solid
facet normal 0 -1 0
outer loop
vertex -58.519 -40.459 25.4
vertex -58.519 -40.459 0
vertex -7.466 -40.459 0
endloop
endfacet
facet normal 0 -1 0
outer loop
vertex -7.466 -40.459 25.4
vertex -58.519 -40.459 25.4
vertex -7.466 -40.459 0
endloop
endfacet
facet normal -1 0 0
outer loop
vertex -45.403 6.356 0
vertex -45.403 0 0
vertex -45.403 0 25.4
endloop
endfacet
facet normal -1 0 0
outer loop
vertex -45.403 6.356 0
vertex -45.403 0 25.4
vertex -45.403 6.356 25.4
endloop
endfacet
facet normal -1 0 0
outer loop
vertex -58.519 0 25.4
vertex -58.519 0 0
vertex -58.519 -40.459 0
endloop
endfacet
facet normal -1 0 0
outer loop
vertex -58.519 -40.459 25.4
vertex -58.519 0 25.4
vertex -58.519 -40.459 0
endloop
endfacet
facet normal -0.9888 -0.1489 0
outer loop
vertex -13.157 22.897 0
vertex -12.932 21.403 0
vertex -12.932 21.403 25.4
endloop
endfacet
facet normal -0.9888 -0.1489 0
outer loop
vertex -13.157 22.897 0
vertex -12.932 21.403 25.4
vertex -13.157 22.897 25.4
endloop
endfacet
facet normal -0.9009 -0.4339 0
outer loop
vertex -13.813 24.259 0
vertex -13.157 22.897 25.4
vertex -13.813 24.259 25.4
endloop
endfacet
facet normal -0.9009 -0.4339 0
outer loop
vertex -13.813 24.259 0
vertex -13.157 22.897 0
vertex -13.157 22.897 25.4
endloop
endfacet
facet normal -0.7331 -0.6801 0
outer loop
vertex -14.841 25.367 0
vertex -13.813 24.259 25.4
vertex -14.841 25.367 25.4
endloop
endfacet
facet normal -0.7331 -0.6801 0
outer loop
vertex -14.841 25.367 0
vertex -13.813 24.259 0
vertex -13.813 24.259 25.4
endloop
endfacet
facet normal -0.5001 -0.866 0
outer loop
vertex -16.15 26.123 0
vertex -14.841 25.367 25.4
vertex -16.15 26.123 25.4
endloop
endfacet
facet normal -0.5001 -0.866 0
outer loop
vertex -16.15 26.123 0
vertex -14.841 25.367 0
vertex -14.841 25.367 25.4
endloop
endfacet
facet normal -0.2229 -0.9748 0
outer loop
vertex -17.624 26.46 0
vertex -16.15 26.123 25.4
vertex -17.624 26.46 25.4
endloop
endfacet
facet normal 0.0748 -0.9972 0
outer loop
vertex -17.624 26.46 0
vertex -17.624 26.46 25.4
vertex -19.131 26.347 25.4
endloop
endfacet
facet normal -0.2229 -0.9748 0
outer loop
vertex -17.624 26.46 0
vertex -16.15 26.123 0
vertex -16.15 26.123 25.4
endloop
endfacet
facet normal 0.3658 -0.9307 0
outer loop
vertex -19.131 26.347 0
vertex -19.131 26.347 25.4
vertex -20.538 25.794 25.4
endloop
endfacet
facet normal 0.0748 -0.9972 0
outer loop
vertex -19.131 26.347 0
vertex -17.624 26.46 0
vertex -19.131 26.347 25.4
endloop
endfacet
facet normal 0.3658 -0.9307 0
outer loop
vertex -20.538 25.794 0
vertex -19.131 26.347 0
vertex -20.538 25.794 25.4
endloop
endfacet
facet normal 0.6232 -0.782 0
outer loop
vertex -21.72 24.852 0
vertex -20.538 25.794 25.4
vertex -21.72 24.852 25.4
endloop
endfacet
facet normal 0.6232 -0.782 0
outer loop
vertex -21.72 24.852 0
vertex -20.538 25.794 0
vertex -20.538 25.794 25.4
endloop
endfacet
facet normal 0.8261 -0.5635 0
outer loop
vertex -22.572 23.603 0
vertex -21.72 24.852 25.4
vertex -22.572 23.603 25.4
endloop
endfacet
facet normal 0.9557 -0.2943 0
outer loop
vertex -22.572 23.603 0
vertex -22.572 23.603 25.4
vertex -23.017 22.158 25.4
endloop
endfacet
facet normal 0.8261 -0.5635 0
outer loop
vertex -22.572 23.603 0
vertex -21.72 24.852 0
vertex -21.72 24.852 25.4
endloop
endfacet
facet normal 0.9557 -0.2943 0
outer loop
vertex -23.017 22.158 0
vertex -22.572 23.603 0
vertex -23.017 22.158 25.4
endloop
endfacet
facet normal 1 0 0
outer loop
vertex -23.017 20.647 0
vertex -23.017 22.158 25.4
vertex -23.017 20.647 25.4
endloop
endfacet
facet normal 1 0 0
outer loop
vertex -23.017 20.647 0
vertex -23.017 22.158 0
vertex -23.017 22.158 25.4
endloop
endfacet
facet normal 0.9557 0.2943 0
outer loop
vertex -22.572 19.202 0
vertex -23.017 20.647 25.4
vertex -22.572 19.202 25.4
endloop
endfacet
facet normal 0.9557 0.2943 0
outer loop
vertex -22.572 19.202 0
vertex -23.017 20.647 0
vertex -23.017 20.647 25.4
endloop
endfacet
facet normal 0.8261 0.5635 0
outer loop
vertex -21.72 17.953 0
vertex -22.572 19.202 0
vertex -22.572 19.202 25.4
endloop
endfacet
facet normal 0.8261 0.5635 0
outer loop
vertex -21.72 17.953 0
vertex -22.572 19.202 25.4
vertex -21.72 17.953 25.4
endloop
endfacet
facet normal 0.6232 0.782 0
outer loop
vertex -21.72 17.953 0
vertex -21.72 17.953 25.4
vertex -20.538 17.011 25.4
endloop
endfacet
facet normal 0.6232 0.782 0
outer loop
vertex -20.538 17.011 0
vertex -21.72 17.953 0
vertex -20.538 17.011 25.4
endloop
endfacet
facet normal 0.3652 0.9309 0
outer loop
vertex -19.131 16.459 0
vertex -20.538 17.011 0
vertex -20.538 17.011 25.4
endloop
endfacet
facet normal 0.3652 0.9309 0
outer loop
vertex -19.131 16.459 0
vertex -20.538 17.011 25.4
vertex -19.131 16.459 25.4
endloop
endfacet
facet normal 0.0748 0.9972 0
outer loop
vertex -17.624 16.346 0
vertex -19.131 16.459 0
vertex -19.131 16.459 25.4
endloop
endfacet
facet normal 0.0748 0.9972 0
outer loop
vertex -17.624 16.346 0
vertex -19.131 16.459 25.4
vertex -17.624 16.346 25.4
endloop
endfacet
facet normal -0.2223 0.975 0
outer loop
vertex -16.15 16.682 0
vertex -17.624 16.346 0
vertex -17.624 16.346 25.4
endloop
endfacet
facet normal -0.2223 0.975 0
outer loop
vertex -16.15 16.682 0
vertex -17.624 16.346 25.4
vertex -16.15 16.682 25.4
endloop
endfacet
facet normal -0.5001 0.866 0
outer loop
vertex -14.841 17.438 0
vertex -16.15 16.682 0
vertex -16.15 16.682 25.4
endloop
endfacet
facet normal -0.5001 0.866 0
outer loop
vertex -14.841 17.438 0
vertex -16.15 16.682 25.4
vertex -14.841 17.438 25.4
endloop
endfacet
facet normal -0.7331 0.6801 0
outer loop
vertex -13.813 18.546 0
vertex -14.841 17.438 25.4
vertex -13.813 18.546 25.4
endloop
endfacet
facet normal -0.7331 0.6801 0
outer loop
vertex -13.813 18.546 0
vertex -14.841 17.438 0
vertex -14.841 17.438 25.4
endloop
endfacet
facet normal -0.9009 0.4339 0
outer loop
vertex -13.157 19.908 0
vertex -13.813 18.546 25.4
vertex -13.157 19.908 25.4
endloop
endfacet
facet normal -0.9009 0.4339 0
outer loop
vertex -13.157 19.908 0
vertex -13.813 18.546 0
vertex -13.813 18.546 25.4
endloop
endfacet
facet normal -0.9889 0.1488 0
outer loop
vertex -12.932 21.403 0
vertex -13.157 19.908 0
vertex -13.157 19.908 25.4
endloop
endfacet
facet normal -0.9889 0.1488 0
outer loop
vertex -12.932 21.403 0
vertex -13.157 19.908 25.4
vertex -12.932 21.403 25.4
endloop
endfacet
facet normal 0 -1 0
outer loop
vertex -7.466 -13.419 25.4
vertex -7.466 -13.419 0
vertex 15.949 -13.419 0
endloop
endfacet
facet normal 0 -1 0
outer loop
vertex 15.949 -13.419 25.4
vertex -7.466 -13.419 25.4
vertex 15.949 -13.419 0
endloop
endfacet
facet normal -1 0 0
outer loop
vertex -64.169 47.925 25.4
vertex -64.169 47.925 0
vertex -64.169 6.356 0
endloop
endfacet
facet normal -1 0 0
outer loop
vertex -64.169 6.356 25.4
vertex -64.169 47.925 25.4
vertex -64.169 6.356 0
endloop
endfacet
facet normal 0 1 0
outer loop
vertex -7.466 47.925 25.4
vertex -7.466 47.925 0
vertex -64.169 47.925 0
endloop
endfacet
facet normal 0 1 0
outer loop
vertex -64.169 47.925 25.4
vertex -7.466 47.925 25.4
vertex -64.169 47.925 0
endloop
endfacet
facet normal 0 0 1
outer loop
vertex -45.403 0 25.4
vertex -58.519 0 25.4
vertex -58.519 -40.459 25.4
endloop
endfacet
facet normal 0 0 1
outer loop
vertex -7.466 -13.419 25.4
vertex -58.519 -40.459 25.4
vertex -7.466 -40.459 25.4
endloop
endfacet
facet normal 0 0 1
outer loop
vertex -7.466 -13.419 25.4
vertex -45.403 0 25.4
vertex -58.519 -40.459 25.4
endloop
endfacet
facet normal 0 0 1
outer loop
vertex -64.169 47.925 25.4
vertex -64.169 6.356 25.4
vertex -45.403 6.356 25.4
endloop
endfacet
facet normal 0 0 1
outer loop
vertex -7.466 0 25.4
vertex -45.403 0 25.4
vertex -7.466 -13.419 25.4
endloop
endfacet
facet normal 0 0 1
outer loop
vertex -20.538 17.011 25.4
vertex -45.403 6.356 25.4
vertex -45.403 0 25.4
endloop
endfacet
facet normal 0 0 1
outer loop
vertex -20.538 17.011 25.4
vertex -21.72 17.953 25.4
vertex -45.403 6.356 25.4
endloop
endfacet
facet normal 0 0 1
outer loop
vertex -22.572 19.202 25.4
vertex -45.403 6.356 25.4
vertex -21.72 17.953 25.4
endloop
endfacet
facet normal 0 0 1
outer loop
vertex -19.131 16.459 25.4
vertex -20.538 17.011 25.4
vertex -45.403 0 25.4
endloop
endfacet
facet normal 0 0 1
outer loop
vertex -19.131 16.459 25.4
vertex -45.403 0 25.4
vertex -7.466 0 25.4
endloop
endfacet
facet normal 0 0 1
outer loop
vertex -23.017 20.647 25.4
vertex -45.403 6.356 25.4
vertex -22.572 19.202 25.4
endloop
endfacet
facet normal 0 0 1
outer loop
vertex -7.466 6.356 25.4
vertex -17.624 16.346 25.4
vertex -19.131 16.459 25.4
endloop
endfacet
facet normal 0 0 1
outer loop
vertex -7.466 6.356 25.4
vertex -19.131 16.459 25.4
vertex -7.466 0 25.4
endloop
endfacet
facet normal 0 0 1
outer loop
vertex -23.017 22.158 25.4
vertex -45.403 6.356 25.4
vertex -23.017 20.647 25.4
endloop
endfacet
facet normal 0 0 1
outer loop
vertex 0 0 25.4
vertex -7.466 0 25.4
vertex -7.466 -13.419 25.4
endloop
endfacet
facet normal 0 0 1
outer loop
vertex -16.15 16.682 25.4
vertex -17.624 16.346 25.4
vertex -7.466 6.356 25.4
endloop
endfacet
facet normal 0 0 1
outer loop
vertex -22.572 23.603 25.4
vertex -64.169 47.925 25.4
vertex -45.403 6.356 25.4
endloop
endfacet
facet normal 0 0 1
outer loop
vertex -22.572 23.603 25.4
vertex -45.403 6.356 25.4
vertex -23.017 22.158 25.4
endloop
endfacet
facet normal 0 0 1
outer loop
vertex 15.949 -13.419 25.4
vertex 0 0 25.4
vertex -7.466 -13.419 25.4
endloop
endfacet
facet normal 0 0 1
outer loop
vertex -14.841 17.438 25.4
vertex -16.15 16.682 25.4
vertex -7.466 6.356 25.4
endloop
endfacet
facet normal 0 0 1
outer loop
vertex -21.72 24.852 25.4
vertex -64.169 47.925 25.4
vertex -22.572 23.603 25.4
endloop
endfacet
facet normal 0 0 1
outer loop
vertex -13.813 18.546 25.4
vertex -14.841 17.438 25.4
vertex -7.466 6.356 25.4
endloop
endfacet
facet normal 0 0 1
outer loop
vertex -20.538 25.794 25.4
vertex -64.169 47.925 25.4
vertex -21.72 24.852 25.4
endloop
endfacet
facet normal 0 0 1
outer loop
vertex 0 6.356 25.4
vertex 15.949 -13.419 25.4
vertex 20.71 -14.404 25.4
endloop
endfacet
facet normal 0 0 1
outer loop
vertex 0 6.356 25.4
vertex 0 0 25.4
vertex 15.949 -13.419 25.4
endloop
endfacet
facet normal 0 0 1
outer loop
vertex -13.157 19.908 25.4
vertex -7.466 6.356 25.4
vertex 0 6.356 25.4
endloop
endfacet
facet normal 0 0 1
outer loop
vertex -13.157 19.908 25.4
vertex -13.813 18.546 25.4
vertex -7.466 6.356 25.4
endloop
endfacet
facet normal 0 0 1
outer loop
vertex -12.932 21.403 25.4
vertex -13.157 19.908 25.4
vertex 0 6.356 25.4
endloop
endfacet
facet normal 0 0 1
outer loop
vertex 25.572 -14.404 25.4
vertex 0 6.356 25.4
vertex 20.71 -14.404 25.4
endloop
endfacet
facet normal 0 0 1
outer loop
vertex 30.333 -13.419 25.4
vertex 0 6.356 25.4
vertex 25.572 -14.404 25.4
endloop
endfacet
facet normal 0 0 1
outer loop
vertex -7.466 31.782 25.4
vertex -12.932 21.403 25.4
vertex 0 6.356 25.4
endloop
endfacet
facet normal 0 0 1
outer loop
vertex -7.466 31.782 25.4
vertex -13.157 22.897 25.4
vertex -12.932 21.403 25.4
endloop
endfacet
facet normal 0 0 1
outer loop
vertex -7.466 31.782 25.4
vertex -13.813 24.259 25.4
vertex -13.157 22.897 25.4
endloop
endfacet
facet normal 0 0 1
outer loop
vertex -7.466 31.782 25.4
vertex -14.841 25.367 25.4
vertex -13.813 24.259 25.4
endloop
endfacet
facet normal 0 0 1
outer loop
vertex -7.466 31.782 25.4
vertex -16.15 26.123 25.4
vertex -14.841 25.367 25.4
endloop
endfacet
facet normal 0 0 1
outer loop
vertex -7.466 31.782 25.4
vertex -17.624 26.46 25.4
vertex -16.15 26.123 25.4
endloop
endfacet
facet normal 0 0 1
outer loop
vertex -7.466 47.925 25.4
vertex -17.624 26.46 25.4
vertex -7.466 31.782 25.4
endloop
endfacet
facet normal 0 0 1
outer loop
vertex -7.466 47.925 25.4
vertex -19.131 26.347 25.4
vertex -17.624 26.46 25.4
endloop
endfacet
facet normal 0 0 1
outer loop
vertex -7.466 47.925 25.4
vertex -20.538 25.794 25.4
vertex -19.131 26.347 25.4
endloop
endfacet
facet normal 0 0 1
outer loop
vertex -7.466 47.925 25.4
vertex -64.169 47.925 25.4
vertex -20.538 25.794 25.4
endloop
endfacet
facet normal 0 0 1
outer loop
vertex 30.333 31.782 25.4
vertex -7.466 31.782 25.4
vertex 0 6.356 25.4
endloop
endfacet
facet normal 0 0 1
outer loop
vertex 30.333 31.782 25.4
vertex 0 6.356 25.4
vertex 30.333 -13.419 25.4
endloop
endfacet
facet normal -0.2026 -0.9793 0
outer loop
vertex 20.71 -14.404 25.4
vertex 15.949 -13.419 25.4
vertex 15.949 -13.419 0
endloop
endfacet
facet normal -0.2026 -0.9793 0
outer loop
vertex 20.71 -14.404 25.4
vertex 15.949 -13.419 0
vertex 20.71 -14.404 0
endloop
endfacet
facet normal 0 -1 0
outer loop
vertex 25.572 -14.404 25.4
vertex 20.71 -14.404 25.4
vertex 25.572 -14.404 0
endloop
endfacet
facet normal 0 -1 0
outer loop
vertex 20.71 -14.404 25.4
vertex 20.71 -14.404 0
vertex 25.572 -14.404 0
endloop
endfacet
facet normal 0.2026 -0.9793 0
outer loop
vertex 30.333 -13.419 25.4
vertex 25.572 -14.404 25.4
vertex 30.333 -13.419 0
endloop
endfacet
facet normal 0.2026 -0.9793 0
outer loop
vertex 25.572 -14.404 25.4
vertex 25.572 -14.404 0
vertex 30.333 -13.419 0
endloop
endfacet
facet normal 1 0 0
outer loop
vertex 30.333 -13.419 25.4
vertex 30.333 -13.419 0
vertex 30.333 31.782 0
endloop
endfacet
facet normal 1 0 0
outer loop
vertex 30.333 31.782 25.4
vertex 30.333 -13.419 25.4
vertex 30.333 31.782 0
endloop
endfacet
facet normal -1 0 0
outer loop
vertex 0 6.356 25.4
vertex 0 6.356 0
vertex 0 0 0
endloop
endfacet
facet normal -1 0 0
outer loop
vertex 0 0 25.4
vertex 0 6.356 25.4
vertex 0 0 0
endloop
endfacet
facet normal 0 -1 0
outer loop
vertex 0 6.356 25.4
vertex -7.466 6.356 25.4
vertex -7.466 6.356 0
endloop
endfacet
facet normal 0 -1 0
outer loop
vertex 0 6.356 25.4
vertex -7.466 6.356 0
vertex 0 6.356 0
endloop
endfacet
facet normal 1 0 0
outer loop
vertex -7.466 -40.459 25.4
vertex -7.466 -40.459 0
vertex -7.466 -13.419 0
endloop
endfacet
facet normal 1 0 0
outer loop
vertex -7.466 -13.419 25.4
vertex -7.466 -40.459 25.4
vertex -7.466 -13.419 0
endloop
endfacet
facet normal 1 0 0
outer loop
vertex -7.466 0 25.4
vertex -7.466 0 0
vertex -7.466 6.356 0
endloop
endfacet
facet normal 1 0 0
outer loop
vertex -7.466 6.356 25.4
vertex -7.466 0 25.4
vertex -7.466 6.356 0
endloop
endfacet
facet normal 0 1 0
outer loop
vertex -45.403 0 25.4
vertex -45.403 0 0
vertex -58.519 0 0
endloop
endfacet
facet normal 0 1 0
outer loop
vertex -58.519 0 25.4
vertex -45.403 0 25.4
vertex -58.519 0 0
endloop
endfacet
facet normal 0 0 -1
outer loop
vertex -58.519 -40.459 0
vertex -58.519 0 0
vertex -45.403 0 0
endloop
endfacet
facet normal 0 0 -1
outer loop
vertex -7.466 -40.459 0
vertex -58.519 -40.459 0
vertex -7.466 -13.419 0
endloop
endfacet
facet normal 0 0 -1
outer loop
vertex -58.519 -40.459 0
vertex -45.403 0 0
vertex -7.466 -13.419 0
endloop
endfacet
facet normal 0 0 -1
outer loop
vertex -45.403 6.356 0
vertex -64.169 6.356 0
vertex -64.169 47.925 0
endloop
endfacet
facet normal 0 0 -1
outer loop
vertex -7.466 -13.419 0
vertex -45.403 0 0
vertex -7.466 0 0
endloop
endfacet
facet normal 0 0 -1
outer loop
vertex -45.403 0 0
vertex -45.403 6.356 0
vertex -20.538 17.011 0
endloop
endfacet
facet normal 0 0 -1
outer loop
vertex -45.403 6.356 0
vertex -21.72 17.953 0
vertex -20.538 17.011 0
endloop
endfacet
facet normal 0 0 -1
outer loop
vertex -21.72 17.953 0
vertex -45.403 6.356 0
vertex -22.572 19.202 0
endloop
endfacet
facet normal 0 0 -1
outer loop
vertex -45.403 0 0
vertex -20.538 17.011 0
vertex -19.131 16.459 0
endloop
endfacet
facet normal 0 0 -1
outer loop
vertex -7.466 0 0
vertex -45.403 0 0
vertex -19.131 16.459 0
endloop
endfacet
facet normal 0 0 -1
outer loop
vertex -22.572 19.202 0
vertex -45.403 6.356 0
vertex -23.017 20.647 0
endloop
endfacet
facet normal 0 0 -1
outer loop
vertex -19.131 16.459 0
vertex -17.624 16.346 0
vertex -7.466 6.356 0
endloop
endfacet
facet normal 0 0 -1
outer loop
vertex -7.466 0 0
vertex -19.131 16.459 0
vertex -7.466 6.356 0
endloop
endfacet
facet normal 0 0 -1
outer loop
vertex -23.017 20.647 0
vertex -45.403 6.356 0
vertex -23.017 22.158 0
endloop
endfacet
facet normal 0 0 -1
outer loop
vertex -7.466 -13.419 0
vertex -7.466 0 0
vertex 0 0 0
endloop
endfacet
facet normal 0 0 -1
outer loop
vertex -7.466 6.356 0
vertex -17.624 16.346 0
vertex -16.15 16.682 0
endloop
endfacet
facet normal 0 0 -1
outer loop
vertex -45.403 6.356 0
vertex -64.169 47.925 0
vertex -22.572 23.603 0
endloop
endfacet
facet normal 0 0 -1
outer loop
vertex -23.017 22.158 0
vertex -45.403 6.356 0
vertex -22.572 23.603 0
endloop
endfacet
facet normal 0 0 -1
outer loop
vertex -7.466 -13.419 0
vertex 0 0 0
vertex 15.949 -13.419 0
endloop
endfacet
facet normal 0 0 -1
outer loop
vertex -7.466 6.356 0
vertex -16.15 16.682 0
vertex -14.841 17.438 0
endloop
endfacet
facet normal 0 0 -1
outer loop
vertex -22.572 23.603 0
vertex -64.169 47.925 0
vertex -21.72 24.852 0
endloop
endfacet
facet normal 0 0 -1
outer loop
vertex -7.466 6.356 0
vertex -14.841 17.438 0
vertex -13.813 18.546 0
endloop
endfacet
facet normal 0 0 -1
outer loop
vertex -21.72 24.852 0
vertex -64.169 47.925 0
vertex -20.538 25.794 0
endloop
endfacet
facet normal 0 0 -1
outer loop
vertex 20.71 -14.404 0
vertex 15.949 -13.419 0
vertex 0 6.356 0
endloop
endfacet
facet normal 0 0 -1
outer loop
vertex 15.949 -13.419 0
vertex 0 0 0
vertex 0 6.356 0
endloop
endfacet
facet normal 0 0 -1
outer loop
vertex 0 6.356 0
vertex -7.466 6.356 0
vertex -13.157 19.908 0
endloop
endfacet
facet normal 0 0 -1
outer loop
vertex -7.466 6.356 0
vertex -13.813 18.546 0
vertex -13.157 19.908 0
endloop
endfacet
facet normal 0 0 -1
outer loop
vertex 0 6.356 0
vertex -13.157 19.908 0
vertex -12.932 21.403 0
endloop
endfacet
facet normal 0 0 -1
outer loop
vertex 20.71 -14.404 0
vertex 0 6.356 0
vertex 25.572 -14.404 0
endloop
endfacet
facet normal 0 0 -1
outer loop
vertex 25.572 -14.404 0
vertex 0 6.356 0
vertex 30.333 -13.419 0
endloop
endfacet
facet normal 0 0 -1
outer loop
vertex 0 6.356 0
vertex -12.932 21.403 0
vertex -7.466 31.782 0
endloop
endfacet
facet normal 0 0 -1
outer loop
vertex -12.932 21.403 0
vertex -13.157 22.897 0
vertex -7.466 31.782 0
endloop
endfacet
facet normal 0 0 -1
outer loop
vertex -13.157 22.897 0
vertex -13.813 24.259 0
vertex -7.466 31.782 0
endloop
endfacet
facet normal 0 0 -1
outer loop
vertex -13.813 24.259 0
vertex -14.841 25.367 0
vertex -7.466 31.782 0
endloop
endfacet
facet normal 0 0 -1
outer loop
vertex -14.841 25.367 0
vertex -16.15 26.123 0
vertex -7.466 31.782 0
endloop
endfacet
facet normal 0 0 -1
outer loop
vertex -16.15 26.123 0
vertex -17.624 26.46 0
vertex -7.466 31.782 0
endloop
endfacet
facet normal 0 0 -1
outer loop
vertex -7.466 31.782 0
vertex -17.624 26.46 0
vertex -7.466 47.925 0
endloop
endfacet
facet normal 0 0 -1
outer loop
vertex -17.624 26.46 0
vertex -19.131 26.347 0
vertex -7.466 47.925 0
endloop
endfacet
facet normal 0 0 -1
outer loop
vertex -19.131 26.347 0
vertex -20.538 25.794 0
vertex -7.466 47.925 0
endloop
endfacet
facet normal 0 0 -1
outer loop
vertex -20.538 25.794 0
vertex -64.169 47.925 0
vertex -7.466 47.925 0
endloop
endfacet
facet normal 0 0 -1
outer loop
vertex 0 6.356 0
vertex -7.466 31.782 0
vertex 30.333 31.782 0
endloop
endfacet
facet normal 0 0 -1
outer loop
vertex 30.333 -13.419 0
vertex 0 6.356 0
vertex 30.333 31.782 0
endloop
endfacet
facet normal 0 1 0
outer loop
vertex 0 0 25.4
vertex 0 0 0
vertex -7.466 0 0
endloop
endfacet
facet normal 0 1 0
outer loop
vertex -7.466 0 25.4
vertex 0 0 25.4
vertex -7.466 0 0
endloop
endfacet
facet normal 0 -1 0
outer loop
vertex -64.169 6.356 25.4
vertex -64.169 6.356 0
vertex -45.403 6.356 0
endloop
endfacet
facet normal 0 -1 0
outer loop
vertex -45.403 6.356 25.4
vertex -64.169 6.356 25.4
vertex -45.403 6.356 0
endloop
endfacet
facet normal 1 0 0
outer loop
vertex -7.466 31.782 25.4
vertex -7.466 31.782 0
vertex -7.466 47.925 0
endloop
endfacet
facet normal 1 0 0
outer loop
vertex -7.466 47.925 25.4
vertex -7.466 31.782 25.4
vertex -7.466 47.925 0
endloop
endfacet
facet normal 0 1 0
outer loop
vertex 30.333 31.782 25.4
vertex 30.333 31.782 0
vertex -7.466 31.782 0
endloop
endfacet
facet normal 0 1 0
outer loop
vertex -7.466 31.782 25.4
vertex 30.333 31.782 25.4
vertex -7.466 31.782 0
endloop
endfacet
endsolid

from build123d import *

# Parameters (mm, degrees)
F0_W     = 37.936644163
F0_H     = 25.4256250337
F0_R     = 5.0710694704
F0_H_2   = 6.3564060256
F0_H_3   = 13.4190795943
F1_DEPTH = 25.4
F2_DEPTH = 25.4


with BuildPart() as f1:
    # F0 (on Top) → F1 (new body)
    with BuildSketch(Plane.XY):
        Polygon((-7.4662552215, 47.9252822697), (-64.1694366932, 47.9252822697), (-64.1694366932, 6.3564060256), (-45.4028993845, 6.3564060256), (-45.4028993845, 31.7820310593), (-7.4662552215, 31.7820310593), align=None)
        with BuildLine():
            Line((15.0090710029, 31.7820310593), (-7.4662552215, 31.7820310593))
            Line((-7.4662552215, 31.7820310593), (-7.4662552215, 6.3564060256))
            Line((-7.4662552215, 6.3564060256), (-0.5410785656, 6.3564060256))
            ThreePointArc((-0.5410785656, 6.3564060256), (2.7780197693, 21.7944652245), (15.0090710029, 31.7820310593))
        make_face()
        with Locations((-26.434577303, 19.0692185424)):
            Rectangle(F0_W, F0_H)
        with Locations((-18.0028378963, 21.4026346803)):
            Circle(F0_R, mode=Mode.SUBTRACT)
        with Locations((-26.434577303, 3.1782030128)):
            Rectangle(F0_W, F0_H_2)
        with BuildLine():
            Line((30.3325485438, 31.7820310593), (15.0090710029, 31.7820310593))
            ThreePointArc((15.0090710029, 31.7820310593), (2.7780197693, 21.7944652245), (-0.5410785656, 6.3564060256))
            Line((-0.5410785656, 6.3564060256), (0, 6.3564060256))
            Line((0, 6.3564060256), (0, 3.4891846957))
            ThreePointArc((0, 3.4891846957), (5.7772927996, -7.0374210767), (15.9488696559, -13.4190795943))
            Line((15.9488696559, -13.4190795943), (30.3325485438, -13.4190795943))
            Line((30.3325485438, -13.4190795943), (30.3325485438, 31.7820310593))
        make_face()
        Polygon((-45.4028993845, -13.4190795943), (-45.4028993845, 0), (-58.5192963481, 0), (-58.5192963481, -40.4590293765), (-7.4662552215, -40.4590293765), (-7.4662552215, -13.4190795943), align=None)
        with Locations((-26.434577303, -6.7095397972)):
            Rectangle(F0_W, F0_H_3)
        with BuildLine():
            Line((0, 0), (-7.4662552215, 0))
            Line((-7.4662552215, 0), (-7.4662552215, -13.4190795943))
            Line((-7.4662552215, -13.4190795943), (15.9488696559, -13.4190795943))
            ThreePointArc((15.9488696559, -13.4190795943), (5.7772927996, -7.0374210767), (0, 3.4891846957))
            Line((0, 3.4891846957), (0, 0))
        make_face()
        with BuildLine():
            ThreePointArc((15.9488696559, -13.4190795943), (23.1407090998, -14.5283166529), (30.3325485438, -13.4190795943))
            Line((30.3325485438, -13.4190795943), (15.9488696559, -13.4190795943))
        make_face()
    extrude(amount=F1_DEPTH)

    # F0 (on Top) → F2 (join)
    with BuildSketch(Plane.XY):
        Polygon((-7.4662552215, 47.9252822697), (-64.1694366932, 47.9252822697), (-64.1694366932, 6.3564060256), (-45.4028993845, 6.3564060256), (-45.4028993845, 31.7820310593), (-7.4662552215, 31.7820310593), align=None)
        with BuildLine():
            Line((15.0090710029, 31.7820310593), (-7.4662552215, 31.7820310593))
            Line((-7.4662552215, 31.7820310593), (-7.4662552215, 6.3564060256))
            Line((-7.4662552215, 6.3564060256), (-0.5410785656, 6.3564060256))
            ThreePointArc((-0.5410785656, 6.3564060256), (2.7780197693, 21.7944652245), (15.0090710029, 31.7820310593))
        make_face()
        with Locations((-26.434577303, 19.0692185424)):
            Rectangle(F0_W, F0_H)
        with Locations((-18.0028378963, 21.4026346803)):
            Circle(F0_R, mode=Mode.SUBTRACT)
        with Locations((-26.434577303, 3.1782030128)):
            Rectangle(F0_W, F0_H_2)
        with BuildLine():
            Line((30.3325485438, 31.7820310593), (15.0090710029, 31.7820310593))
            ThreePointArc((15.0090710029, 31.7820310593), (2.7780197693, 21.7944652245), (-0.5410785656, 6.3564060256))
            Line((-0.5410785656, 6.3564060256), (0, 6.3564060256))
            Line((0, 6.3564060256), (0, 3.4891846957))
            ThreePointArc((0, 3.4891846957), (5.7772927996, -7.0374210767), (15.9488696559, -13.4190795943))
            Line((15.9488696559, -13.4190795943), (30.3325485438, -13.4190795943))
            Line((30.3325485438, -13.4190795943), (30.3325485438, 31.7820310593))
        make_face()
        Polygon((-45.4028993845, -13.4190795943), (-45.4028993845, 0), (-58.5192963481, 0), (-58.5192963481, -40.4590293765), (-7.4662552215, -40.4590293765), (-7.4662552215, -13.4190795943), align=None)
        with Locations((-26.434577303, -6.7095397972)):
            Rectangle(F0_W, F0_H_3)
        with BuildLine():
            Line((0, 0), (-7.4662552215, 0))
            Line((-7.4662552215, 0), (-7.4662552215, -13.4190795943))
            Line((-7.4662552215, -13.4190795943), (15.9488696559, -13.4190795943))
            ThreePointArc((15.9488696559, -13.4190795943), (5.7772927996, -7.0374210767), (0, 3.4891846957))
            Line((0, 3.4891846957), (0, 0))
        make_face()
        with BuildLine():
            ThreePointArc((15.9488696559, -13.4190795943), (23.1407090998, -14.5283166529), (30.3325485438, -13.4190795943))
            Line((30.3325485438, -13.4190795943), (15.9488696559, -13.4190795943))
        make_face()
    extrude(amount=F2_DEPTH)


solid = f1.part
